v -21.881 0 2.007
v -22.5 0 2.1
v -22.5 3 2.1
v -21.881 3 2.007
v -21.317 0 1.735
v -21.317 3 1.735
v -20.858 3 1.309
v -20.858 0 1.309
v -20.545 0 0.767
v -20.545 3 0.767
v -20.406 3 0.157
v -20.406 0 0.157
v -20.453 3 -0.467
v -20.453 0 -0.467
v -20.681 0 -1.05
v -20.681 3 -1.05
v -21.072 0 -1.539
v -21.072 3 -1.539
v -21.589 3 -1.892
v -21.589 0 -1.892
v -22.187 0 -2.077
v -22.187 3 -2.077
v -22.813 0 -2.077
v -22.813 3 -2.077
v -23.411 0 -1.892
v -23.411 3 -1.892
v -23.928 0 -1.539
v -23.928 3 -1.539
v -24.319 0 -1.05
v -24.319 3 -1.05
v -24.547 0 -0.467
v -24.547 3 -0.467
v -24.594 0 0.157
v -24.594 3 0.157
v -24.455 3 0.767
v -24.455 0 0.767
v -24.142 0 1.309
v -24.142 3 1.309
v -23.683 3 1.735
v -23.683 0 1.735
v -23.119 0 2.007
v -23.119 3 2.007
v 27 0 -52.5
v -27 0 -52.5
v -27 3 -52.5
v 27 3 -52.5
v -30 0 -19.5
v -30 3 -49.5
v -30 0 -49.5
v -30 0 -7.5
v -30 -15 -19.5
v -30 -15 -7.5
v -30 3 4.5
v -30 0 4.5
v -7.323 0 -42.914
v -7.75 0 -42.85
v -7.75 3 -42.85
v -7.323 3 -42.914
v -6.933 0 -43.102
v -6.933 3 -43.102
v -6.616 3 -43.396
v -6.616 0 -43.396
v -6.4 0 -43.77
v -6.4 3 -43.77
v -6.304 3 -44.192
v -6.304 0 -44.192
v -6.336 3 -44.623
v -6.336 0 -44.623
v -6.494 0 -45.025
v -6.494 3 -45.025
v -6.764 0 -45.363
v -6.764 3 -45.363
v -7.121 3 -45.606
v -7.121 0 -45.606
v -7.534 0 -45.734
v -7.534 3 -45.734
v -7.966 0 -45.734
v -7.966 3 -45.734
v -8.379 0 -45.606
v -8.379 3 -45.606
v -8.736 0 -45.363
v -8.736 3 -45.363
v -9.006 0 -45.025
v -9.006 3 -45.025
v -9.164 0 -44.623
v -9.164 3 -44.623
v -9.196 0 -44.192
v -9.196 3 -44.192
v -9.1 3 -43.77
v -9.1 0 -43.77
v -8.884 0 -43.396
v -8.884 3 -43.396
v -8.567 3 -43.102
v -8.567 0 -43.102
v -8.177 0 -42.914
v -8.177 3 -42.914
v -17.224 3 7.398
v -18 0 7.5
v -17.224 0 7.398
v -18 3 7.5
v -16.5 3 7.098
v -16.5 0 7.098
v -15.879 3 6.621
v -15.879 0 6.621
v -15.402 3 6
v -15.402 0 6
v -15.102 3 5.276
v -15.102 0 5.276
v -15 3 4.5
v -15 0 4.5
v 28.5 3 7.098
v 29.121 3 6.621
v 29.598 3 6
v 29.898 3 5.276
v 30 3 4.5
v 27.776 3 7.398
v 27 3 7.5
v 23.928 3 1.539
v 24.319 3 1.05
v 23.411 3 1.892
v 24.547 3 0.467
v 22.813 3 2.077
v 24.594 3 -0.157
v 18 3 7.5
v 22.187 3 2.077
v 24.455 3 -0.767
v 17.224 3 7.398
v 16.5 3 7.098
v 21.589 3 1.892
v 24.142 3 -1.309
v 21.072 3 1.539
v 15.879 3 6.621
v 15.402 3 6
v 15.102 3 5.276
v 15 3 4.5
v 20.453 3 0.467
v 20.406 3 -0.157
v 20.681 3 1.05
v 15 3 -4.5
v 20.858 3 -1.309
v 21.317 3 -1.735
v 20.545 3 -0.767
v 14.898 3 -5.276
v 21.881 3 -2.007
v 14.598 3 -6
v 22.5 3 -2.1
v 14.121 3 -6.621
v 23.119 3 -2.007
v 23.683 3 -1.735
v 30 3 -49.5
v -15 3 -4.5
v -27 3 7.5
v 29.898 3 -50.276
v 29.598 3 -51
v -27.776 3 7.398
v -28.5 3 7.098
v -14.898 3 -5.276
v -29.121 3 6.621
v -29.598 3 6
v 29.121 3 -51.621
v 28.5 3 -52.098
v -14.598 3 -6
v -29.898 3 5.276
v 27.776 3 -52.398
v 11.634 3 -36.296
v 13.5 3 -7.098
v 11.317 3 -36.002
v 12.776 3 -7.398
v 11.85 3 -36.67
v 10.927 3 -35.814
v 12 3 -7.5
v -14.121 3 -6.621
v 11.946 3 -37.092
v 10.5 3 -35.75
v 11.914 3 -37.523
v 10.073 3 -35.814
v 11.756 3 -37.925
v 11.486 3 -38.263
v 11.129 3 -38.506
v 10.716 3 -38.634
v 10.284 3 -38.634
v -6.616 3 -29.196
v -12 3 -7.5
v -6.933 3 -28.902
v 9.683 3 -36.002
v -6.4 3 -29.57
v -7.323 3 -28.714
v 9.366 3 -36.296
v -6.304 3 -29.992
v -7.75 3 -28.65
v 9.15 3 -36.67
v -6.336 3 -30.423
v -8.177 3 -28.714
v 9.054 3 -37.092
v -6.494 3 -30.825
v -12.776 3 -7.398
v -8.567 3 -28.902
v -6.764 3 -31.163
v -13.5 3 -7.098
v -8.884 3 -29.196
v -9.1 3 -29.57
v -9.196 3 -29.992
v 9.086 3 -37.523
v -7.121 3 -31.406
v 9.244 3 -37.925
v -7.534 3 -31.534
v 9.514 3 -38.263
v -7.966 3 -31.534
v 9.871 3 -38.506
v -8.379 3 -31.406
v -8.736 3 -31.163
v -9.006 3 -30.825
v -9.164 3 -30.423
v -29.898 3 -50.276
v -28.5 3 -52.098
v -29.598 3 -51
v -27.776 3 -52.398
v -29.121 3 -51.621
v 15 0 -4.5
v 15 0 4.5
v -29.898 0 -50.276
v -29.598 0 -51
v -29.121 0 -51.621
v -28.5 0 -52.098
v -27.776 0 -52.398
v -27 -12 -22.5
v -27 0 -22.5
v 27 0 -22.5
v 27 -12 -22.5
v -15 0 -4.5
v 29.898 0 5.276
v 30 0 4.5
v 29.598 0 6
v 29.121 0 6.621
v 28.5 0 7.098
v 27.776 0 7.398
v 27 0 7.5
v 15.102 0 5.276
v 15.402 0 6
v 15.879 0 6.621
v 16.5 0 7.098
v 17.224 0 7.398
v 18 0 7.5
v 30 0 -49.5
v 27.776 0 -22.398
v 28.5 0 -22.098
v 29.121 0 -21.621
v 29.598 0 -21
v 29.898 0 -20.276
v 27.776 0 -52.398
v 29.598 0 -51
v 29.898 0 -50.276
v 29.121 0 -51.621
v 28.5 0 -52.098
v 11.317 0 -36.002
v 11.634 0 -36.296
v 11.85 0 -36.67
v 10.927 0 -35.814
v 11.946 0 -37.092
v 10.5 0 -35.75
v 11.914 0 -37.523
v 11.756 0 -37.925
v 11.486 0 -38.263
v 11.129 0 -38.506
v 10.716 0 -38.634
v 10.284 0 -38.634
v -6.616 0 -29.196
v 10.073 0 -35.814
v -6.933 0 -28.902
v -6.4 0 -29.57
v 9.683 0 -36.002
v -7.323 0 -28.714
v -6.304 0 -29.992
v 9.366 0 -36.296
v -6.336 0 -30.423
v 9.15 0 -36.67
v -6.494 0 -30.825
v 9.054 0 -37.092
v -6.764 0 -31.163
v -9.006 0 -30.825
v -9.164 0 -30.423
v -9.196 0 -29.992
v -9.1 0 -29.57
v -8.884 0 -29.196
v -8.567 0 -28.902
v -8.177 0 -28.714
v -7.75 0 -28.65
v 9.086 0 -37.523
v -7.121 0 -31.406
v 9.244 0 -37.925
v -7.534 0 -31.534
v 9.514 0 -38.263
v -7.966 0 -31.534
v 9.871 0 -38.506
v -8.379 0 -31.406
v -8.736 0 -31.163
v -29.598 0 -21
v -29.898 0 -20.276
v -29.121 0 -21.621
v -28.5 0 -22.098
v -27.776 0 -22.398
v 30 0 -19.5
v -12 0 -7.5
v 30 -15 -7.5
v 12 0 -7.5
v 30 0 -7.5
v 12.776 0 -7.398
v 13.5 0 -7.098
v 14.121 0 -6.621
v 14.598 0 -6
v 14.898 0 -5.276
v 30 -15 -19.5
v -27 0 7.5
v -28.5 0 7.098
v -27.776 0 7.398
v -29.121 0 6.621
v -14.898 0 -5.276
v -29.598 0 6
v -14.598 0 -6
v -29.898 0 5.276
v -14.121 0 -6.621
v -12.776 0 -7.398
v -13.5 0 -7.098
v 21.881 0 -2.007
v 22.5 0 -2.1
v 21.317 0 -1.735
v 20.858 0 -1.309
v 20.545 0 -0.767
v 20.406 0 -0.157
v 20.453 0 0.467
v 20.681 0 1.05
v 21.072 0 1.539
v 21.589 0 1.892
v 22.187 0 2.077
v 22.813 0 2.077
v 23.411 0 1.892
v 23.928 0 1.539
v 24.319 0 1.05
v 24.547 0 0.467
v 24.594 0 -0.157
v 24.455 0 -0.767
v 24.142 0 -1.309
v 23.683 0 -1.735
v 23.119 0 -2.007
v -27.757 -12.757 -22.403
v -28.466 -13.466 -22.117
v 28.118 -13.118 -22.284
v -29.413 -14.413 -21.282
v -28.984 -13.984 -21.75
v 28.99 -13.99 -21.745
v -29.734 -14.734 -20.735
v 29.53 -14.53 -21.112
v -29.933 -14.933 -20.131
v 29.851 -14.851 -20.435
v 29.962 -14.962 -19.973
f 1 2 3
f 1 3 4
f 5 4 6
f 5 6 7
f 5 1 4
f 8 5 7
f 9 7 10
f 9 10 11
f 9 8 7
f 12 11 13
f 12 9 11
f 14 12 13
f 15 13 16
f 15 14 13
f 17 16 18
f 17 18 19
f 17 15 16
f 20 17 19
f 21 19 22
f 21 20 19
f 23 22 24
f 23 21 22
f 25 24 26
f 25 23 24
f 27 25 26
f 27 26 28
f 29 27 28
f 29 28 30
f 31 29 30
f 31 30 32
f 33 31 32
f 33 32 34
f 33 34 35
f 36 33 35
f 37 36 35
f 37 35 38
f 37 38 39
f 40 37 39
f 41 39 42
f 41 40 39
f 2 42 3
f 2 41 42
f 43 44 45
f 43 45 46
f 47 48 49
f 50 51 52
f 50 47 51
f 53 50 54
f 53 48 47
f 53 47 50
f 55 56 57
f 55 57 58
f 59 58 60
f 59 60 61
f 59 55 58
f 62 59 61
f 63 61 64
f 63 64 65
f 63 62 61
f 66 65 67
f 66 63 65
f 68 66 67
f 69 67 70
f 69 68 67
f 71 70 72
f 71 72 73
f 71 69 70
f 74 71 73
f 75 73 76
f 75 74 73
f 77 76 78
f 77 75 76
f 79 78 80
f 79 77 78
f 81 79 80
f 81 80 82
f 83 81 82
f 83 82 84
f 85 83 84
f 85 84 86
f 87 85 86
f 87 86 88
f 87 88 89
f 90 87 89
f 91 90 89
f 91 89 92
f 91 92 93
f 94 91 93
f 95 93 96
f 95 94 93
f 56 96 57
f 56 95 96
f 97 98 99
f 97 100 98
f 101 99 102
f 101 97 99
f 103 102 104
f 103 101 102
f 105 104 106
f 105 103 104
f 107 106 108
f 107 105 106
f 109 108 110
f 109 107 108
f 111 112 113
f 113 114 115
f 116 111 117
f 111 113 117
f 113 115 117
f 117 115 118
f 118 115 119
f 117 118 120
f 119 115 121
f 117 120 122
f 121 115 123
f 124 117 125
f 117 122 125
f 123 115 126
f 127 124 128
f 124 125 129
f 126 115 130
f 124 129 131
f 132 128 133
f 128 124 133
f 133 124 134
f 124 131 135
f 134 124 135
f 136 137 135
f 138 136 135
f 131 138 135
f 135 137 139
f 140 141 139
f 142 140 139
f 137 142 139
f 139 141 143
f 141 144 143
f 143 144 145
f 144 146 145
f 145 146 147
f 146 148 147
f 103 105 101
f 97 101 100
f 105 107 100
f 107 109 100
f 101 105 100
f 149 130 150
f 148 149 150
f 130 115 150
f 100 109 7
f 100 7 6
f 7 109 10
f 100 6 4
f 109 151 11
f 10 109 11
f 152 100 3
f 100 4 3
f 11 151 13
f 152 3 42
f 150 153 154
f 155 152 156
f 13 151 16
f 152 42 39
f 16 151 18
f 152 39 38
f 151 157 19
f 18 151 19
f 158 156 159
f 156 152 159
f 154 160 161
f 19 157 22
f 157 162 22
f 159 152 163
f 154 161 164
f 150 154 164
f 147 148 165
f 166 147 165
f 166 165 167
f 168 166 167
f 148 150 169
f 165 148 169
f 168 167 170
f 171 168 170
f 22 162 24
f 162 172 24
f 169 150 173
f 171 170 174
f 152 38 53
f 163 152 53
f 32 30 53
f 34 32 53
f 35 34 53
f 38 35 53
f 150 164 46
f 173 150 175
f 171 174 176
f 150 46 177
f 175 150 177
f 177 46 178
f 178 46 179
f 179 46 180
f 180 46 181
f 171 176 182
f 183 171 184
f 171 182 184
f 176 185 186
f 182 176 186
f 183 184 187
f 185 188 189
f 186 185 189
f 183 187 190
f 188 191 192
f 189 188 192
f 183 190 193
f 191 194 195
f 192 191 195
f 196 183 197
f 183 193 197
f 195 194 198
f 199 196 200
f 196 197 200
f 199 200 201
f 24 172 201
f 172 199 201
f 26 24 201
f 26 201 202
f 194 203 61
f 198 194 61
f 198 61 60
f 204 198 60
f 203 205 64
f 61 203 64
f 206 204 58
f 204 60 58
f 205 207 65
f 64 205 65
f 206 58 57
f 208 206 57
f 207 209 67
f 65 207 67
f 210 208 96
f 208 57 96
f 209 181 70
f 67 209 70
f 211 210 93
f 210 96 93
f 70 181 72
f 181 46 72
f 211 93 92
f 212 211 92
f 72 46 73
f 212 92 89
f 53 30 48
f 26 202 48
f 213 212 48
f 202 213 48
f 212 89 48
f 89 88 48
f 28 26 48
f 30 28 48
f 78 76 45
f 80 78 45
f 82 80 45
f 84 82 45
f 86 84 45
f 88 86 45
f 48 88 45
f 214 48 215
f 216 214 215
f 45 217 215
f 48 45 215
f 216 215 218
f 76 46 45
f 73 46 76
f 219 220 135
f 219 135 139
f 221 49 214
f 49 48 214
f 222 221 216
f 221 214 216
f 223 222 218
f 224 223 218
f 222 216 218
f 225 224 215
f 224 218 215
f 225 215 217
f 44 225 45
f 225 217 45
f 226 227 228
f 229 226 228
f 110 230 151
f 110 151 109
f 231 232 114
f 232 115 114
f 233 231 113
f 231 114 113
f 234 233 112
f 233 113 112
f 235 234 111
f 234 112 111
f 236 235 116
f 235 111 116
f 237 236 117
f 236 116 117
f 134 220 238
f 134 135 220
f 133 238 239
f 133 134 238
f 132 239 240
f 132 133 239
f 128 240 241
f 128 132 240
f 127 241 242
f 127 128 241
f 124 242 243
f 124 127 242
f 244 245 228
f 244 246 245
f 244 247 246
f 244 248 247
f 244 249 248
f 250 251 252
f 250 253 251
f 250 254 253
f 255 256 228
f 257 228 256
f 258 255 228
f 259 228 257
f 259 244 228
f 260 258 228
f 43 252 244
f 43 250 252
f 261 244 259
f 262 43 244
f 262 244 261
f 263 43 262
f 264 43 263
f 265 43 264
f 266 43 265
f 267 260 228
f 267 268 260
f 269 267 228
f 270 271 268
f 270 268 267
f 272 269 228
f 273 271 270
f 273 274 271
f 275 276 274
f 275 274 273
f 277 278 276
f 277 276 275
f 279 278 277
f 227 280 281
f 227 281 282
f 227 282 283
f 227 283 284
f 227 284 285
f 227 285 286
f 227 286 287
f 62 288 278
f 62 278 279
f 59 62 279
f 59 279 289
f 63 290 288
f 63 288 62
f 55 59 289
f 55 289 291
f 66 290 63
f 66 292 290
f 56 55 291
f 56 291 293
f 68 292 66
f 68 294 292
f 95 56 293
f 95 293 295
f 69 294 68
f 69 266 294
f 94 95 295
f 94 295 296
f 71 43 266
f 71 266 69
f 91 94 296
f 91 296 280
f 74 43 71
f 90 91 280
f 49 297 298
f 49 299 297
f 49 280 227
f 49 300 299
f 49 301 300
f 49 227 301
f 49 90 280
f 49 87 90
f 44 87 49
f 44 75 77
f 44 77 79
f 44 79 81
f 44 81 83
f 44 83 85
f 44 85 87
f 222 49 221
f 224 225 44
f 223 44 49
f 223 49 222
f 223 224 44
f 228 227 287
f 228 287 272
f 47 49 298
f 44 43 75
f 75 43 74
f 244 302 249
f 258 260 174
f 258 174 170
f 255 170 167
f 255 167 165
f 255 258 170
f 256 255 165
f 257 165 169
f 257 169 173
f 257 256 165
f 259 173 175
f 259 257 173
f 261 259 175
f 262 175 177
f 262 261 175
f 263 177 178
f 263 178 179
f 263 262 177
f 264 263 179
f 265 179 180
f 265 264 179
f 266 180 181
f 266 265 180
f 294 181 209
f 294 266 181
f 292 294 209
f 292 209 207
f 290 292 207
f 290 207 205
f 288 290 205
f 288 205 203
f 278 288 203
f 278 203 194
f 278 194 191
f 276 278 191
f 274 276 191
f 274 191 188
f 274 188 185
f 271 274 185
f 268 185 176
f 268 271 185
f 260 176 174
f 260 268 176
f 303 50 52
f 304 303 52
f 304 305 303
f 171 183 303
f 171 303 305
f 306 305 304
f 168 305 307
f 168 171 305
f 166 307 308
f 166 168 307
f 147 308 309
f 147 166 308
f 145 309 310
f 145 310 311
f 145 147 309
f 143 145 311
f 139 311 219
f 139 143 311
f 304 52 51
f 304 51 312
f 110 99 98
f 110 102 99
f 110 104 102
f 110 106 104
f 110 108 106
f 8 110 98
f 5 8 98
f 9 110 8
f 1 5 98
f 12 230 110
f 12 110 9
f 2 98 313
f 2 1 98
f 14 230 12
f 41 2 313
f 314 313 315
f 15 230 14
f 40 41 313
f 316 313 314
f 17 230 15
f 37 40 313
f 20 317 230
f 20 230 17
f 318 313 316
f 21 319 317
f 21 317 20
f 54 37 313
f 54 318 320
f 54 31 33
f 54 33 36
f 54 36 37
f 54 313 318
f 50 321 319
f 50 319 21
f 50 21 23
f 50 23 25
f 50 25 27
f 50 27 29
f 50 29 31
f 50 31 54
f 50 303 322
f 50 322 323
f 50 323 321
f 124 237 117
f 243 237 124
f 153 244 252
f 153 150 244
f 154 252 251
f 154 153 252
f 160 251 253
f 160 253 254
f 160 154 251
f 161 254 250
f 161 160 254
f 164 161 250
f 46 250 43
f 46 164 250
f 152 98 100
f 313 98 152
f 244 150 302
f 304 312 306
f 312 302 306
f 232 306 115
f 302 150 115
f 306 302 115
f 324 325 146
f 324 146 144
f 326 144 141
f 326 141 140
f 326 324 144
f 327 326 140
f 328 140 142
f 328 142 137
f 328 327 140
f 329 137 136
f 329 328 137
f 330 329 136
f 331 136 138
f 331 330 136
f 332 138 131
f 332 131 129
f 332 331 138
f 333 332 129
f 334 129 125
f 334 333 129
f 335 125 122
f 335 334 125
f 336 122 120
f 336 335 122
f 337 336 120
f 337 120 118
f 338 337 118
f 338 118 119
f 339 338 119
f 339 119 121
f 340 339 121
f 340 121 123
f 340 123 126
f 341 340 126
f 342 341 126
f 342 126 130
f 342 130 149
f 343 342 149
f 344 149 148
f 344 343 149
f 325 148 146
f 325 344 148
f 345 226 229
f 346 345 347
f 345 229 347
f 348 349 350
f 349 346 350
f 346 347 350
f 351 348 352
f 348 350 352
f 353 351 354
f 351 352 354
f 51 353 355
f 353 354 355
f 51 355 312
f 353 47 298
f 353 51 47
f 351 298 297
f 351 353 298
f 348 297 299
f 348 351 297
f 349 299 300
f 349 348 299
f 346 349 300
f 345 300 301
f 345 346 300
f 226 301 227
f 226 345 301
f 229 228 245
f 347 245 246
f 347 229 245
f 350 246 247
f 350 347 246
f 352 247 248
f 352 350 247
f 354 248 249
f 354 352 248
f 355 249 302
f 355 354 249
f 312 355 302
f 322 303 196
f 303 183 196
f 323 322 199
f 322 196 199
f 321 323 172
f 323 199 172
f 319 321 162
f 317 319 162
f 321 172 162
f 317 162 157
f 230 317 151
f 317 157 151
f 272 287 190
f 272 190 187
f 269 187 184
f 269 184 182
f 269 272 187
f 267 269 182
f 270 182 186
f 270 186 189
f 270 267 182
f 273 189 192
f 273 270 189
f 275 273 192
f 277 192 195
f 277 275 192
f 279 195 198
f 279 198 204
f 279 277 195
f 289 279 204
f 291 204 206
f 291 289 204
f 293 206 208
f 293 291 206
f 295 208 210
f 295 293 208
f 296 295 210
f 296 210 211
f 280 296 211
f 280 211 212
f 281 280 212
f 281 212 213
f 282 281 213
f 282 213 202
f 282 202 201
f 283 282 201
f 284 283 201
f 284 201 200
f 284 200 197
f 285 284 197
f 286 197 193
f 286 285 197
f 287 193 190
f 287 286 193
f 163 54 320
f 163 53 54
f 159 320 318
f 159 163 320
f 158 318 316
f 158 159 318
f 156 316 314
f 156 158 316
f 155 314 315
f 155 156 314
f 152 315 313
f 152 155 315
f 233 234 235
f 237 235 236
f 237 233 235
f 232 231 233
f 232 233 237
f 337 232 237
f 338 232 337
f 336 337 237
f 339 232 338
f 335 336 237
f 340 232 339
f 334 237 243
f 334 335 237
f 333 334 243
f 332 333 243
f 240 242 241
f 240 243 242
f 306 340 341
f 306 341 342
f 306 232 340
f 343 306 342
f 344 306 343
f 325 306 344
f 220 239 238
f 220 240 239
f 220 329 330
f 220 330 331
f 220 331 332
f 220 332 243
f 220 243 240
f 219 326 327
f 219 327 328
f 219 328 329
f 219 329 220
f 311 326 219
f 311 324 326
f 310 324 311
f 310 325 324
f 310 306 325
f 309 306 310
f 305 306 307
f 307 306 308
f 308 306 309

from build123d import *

# Parameters (mm, degrees)
SKETCH_1_R      = 2.1
SKETCH_1_R_2    = 1.45
EXTRUDE_1_DEPTH = 3
SKETCH_2_W      = 60
SKETCH_2_H      = 15
EXTRUDE_2_DEPTH = 15
FILLET_1_R      = 3


with BuildPart() as part:
    # 草图1 → 凸台-拉伸1 (new body)
    with BuildSketch(Plane(origin=(0, 0, 0), x_dir=(1, 0, 0), z_dir=(0, 1, 0))):
        Polygon((-15, 7.5), (-15, -7.5), (-30, -7.5), (-30, 52.5), (30, 52.5), (30, -7.5), (15, -7.5), (15, 7.5), align=None)
        with Locations(Location((-22.5, 0, 0), (0, 0, 270))):
            Circle(SKETCH_1_R, mode=Mode.SUBTRACT)
        with Locations(Location((22.5, 0, 0), (0, 0, 90))):
            Circle(SKETCH_1_R, mode=Mode.SUBTRACT)
        with Locations(Location((-7.75, 44.3, 0), (0, 0, 270))):
            Circle(SKETCH_1_R_2, mode=Mode.SUBTRACT)
        with Locations(Location((10.5, 37.2, 0), (0, 0, 270))):
            Circle(SKETCH_1_R_2, mode=Mode.SUBTRACT)
        with Locations(Location((-7.75, 30.1, 0), (0, 0, 270))):
            Circle(SKETCH_1_R_2, mode=Mode.SUBTRACT)
    extrude(amount=EXTRUDE_1_DEPTH)

    # 草图2 → 凸台-拉伸2 (add)
    with BuildSketch(Plane.XZ):
        with Locations((0, -15)):
            Rectangle(SKETCH_2_W, SKETCH_2_H)
    extrude(amount=EXTRUDE_2_DEPTH)

    # 圆角1
    fillet_1_edges = [part.edges().sort_by_distance(p)[0] for p in [
        (-30, 1.5, -52.5),
        (30, 1.5, -52.5),
        (30, 1.5, 7.5),
        (15, 1.5, 7.5),
        (15, 1.5, -7.5),
        (-15, 1.5, -7.5),
        (-15, 1.5, 7.5),
        (-30, 1.5, 7.5),
        (-30, -7.5, -22.5),
        (30, -7.5, -22.5),
        (0, -15, -22.5),
    ]]
    fillet(fillet_1_edges, radius=FILLET_1_R)


solid = part.part
